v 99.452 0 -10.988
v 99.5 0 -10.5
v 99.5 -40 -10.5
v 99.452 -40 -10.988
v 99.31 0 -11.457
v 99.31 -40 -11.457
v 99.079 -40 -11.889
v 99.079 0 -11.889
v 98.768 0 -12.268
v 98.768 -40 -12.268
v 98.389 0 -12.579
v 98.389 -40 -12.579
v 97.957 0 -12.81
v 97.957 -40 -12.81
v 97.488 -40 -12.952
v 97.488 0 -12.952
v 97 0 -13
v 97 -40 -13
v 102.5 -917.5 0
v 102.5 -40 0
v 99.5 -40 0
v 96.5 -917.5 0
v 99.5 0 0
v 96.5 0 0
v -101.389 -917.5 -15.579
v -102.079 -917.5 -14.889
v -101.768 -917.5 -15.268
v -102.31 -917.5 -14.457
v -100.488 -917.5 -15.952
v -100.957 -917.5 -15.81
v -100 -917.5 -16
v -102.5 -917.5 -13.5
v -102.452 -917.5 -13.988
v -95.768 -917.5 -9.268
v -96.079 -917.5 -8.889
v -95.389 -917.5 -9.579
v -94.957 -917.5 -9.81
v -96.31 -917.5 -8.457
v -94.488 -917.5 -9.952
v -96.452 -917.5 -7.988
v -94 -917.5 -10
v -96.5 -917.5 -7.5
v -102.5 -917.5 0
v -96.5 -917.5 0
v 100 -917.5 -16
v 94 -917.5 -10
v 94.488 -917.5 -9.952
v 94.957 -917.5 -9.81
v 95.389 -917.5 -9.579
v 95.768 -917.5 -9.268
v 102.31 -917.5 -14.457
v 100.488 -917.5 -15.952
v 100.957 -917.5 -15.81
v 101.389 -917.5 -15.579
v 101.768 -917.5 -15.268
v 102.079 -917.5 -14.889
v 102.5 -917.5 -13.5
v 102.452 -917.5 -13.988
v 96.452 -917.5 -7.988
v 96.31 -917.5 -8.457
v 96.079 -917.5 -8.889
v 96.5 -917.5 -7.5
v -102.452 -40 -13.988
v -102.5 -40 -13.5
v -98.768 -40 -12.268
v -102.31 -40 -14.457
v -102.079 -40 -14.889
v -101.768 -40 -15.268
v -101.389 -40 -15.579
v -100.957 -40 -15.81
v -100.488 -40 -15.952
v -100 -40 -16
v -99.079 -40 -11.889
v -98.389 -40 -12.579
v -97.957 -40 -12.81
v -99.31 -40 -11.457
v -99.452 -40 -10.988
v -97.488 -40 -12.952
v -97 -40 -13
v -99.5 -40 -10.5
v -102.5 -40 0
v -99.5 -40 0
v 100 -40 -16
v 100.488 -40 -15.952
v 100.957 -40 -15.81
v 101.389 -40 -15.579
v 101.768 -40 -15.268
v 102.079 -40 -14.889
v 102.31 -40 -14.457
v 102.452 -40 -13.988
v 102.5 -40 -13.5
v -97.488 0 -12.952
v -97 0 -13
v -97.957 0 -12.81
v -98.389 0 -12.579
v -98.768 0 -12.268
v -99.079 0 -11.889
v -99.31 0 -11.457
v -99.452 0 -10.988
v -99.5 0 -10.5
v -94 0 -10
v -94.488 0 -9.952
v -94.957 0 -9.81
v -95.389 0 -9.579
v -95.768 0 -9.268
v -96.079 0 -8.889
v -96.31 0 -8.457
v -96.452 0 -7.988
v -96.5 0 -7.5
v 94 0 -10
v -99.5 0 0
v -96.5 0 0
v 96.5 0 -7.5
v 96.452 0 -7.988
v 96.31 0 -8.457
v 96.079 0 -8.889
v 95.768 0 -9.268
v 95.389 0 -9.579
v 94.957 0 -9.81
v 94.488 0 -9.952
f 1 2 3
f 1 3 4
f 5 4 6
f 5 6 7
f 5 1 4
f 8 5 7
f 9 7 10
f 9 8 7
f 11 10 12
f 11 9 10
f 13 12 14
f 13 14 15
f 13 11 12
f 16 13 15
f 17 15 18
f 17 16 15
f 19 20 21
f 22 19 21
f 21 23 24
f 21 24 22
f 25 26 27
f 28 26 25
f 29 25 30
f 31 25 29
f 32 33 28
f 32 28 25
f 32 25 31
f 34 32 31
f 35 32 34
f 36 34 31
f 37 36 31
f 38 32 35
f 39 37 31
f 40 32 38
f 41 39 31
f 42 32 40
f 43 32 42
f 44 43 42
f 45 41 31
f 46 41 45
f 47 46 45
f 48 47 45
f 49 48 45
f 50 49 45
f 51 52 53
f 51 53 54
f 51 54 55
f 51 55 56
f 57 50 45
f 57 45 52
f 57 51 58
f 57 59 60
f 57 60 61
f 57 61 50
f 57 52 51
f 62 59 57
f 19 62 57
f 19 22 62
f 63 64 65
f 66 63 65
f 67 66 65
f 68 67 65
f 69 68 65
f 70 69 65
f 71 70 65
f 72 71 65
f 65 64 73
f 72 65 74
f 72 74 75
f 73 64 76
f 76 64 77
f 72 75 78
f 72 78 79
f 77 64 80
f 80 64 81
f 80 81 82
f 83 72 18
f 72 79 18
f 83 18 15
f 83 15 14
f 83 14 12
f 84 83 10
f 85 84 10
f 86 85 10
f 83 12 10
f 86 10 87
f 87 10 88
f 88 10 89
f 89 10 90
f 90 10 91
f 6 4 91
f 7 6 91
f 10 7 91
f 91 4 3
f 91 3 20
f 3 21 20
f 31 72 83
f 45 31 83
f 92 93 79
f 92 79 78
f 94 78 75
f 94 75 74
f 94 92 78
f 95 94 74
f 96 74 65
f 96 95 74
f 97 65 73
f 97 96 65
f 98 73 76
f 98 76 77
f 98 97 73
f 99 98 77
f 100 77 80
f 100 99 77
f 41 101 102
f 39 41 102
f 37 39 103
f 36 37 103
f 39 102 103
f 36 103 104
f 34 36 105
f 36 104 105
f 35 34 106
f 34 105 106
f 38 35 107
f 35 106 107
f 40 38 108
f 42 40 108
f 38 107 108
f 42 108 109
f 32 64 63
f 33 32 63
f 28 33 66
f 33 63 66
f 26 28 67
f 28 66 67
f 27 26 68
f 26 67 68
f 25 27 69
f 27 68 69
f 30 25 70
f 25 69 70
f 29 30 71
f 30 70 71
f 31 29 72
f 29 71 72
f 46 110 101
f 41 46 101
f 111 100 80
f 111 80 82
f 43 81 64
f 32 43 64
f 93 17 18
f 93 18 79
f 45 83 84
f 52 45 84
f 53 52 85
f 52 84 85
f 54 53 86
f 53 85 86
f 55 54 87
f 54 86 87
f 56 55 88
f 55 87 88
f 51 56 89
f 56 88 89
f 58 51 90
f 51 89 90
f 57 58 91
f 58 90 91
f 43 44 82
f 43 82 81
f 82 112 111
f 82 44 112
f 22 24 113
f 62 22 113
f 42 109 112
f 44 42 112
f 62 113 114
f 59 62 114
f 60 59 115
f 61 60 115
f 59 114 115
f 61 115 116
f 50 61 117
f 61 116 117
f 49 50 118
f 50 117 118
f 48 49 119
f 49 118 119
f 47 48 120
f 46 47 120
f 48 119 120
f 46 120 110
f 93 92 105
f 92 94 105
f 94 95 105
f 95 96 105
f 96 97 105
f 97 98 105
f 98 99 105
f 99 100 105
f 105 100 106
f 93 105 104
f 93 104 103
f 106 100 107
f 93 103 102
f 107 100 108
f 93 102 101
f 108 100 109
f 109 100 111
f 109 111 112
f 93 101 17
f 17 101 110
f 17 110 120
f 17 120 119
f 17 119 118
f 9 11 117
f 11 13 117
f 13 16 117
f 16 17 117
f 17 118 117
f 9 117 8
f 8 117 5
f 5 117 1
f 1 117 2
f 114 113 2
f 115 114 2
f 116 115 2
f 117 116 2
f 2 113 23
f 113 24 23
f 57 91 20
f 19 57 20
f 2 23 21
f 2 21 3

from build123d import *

# Parameters (mm, degrees)
F1_DEPTH = 917.5
F2_DEPTH = 40


with BuildPart() as f1:
    # F0 (on Front) → F1 (new body)
    with BuildSketch(Plane.XZ):
        with BuildLine():
            ThreePointArc((-102.5, -13.5), (-101.767767, -15.267767), (-100, -16))
            Line((-100, -16), (100, -16))
            ThreePointArc((100, -16), (101.767767, -15.267767), (102.5, -13.5))
            Line((102.5, -13.5), (102.5, 0))
            Line((102.5, 0), (99.5, 0))
            Line((99.5, 0), (99.5, -10.5))
            ThreePointArc((99.5, -10.5), (98.767767, -12.267767), (97, -13))
            Line((97, -13), (-97, -13))
            ThreePointArc((-97, -13), (-98.767767, -12.267767), (-99.5, -10.5))
            Line((-99.5, -10.5), (-99.5, 0))
            Line((-99.5, 0), (-102.5, 0))
            Line((-102.5, 0), (-102.5, -13.5))
        make_face()
        with BuildLine():
            Line((-96.5, 0), (-99.5, 0))
            Line((-99.5, 0), (-99.5, -10.5))
            ThreePointArc((-99.5, -10.5), (-98.767767, -12.267767), (-97, -13))
            Line((-97, -13), (97, -13))
            ThreePointArc((97, -13), (98.767767, -12.267767), (99.5, -10.5))
            Line((99.5, -10.5), (99.5, 0))
            Line((99.5, 0), (96.5, 0))
            Line((96.5, 0), (96.5, -7.5))
            ThreePointArc((96.5, -7.5), (95.767767, -9.267767), (94, -10))
            Line((94, -10), (-94, -10))
            ThreePointArc((-94, -10), (-95.767767, -9.267767), (-96.5, -7.5))
            Line((-96.5, -7.5), (-96.5, 0))
        make_face()
    extrude(amount=F1_DEPTH)

    # F0 (on Front) → F2 (cut)
    with BuildSketch(Plane.XZ):
        with BuildLine():
            ThreePointArc((-102.5, -13.5), (-101.767767, -15.267767), (-100, -16))
            Line((-100, -16), (100, -16))
            ThreePointArc((100, -16), (101.767767, -15.267767), (102.5, -13.5))
            Line((102.5, -13.5), (102.5, 0))
            Line((102.5, 0), (99.5, 0))
            Line((99.5, 0), (99.5, -10.5))
            ThreePointArc((99.5, -10.5), (98.767767, -12.267767), (97, -13))
            Line((97, -13), (-97, -13))
            ThreePointArc((-97, -13), (-98.767767, -12.267767), (-99.5, -10.5))
            Line((-99.5, -10.5), (-99.5, 0))
            Line((-99.5, 0), (-102.5, 0))
            Line((-102.5, 0), (-102.5, -13.5))
        make_face()
    extrude(amount=F2_DEPTH, mode=Mode.SUBTRACT)


solid = f1.part
